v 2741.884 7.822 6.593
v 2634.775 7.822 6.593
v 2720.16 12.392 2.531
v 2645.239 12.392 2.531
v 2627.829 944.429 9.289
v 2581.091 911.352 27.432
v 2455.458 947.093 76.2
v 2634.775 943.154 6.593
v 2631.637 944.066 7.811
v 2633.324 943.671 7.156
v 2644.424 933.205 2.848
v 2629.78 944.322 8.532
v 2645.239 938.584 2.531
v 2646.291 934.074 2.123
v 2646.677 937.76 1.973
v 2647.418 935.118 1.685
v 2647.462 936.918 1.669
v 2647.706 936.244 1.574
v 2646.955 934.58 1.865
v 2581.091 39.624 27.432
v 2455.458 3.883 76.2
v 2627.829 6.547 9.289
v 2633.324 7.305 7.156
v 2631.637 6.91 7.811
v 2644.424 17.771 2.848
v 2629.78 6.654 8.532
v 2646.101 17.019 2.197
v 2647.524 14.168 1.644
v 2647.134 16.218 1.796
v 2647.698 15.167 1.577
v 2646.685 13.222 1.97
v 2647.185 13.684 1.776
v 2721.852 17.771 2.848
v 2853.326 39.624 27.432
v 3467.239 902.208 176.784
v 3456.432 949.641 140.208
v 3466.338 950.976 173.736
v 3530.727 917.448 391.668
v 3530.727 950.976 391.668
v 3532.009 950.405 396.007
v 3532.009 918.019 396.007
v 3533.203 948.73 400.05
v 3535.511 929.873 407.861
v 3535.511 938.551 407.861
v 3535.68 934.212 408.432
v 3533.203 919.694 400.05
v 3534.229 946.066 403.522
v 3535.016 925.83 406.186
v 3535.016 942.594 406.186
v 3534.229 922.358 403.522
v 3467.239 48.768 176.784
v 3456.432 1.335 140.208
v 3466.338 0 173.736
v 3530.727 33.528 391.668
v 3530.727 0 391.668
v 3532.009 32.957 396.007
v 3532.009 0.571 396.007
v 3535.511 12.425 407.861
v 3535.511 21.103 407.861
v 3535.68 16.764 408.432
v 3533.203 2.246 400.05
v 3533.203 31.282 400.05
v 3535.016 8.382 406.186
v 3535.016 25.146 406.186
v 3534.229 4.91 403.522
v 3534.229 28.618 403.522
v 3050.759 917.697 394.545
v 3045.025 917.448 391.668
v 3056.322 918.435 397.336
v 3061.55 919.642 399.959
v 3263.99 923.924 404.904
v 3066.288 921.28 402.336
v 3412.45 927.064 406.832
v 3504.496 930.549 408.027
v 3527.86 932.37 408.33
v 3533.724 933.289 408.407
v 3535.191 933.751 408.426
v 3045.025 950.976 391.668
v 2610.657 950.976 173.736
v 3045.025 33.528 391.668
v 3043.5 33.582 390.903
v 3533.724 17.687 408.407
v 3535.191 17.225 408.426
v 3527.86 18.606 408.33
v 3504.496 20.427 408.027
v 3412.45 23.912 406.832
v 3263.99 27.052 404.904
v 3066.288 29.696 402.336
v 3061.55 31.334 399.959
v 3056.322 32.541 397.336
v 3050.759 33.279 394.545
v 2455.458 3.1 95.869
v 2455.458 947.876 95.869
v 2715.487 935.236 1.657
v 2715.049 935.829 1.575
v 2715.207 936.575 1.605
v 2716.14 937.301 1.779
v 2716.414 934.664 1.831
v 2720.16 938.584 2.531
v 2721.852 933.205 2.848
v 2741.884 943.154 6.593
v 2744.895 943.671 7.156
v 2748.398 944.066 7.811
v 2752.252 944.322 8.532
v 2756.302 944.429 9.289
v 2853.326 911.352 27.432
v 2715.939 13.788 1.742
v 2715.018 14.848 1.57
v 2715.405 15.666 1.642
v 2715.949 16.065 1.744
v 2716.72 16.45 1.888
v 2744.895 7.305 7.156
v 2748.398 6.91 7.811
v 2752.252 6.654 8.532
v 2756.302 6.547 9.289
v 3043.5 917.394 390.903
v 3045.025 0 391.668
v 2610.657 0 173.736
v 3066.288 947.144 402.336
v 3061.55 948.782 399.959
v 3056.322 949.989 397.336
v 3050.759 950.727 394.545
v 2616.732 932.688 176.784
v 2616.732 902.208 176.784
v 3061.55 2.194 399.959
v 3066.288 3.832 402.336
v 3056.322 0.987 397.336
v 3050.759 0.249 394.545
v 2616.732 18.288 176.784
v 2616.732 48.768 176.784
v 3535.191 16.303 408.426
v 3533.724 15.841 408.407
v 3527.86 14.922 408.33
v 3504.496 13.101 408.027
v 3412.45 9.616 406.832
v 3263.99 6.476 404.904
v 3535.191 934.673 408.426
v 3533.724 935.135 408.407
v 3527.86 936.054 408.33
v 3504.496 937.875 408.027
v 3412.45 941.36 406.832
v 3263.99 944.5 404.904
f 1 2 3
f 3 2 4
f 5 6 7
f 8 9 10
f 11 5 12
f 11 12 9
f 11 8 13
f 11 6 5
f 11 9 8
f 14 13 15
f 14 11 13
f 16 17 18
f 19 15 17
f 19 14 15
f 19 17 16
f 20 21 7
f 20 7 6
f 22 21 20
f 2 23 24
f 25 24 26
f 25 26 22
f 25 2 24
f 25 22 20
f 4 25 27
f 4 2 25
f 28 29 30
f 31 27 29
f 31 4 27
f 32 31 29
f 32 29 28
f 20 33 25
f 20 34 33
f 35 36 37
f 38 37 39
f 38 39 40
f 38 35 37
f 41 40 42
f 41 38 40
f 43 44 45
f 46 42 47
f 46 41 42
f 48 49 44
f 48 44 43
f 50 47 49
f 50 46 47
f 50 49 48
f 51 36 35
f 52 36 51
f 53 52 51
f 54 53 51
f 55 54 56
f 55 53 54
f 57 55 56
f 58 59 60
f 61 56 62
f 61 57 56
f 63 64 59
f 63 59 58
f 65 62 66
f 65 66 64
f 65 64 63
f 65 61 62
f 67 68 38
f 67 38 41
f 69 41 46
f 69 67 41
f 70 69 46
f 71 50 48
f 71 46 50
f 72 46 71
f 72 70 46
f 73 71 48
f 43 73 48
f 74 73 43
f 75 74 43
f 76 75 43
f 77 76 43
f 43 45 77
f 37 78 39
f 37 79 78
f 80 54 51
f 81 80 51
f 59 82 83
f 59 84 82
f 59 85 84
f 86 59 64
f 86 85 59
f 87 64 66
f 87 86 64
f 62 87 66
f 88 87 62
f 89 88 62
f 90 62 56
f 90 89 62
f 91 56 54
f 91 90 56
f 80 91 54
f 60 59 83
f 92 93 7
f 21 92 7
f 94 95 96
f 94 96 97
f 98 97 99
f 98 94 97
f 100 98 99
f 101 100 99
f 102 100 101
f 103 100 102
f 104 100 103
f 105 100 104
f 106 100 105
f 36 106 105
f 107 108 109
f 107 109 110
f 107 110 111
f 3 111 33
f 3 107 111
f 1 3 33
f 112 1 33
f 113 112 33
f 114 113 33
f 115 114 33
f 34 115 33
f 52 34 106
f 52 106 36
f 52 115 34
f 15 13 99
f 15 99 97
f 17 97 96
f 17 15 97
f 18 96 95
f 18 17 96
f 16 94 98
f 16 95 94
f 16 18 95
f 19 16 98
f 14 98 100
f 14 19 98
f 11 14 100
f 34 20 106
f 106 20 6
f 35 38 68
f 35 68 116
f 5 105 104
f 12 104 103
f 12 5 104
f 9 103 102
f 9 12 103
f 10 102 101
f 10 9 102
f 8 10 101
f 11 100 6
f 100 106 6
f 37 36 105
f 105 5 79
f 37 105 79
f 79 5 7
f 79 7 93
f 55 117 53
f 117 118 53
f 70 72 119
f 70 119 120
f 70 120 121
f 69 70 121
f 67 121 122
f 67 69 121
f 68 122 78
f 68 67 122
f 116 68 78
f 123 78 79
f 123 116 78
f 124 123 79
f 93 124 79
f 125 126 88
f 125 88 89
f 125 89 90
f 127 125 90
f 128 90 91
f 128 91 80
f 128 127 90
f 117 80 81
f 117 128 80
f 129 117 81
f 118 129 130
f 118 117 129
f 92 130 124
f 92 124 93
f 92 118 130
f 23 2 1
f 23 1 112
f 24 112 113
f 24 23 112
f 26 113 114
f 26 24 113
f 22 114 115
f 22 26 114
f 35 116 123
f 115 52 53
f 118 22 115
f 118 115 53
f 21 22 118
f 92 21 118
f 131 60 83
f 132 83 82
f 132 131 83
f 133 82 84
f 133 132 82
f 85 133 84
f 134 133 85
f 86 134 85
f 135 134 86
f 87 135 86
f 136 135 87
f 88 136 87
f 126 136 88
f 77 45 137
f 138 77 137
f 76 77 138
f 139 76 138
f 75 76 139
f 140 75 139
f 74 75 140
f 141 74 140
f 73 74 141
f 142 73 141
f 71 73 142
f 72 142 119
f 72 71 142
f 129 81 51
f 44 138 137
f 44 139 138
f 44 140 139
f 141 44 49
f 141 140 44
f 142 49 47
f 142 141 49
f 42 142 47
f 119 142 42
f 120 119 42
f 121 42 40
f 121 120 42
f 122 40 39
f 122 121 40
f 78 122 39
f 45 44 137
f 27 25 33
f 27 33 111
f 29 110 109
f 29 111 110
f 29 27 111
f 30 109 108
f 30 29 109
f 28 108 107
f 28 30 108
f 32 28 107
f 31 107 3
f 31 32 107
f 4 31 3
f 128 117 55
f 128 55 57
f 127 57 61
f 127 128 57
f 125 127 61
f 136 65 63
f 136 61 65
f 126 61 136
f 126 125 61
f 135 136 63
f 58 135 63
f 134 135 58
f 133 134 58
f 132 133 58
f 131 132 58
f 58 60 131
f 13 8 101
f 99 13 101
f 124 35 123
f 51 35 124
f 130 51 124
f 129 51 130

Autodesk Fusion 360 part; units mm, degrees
sketch "Sketch7" plane through (0, 0, 0) normal (0, 1, 0) x (1, 0, 0)
  line L0 (2455.4576, -95.8693) -> (2455.4576, -76.2)
  line L1 (2455.4576, -76.2) -> (2651.76, 0)
  line L2 (2651.76, 0) -> (2706.624, 0)
  line L3 (2706.624, 0) -> (3456.432, -140.208)
  line L4 (3456.432, -140.208) -> (3535.68, -408.432)
  line L5 (3535.68, -408.432) -> (3066.288, -402.336)
  line L6 (3066.288, -402.336) -> (2455.4576, -95.8693)
extrude "Extrude5" add sketch "Sketch7" along normal blind 950.976
sketch "Sketch8" plane through (0, 0, 0) normal (1, 0, 0) x (0, 1, 0)
  line L0 (950.976, 426.72) -> (0, 426.72)
  line L1 (475.488, 426.72) -> (475.488, -243.84)
  line L2 (1005.84, 457.2) -> (-54.0718, 457.2)
  line L3 (-54.0718, 457.2) -> (-54.0718, -231.5284)
  line L4 (-54.0718, -231.5284) -> (1005.84, -231.5284)
  line L5 (1005.84, -231.5284) -> (1005.84, 457.2)
  line L6 (911.352, 27.432) -> (933.2048, 2.8476)
  line L7 (938.5836, 2.5312) -> (943.1535, 6.5933)
  line L8 (944.4292, 9.2894) -> (950.976, 173.736)
  line L9 (950.976, 173.736) -> (950.976, 391.668)
  line L10 (917.448, 391.668) -> (902.208, 176.784)
  line L11 (902.208, 176.784) -> (475.488, 176.784)
  arc A0 (950.976, 391.668) -> (917.448, 391.668) centre (934.212, 391.668) ccw
  line L12 (911.352, 27.432) -> (475.488, 27.432)
  arc A1 (933.2048, 2.8476) -> (938.5836, 2.5312) centre (936.0524, 5.3789) ccw
  arc A2 (943.1535, 6.5933) -> (944.4292, 9.2894) centre (940.6223, 9.4409) ccw
  line L13 (48.768, 176.784) -> (475.488, 176.784)
  line L14 (33.528, 391.668) -> (48.768, 176.784)
  arc A3 (33.528, 391.668) -> (0, 391.668) centre (16.764, 391.668) ccw
  line L15 (0, 173.736) -> (0, 391.668)
  line L16 (6.5468, 9.2894) -> (0, 173.736)
  arc A4 (6.5468, 9.2894) -> (7.8225, 6.5933) centre (10.3537, 9.4409) ccw
  line L17 (12.3924, 2.5312) -> (7.8225, 6.5933)
  arc A5 (12.3924, 2.5312) -> (17.7712, 2.8476) centre (14.9236, 5.3789) ccw
  line L18 (39.624, 27.432) -> (17.7712, 2.8476)
  line L19 (39.624, 27.432) -> (475.488, 27.432)
  dimension "d19" = 3.81
extrude "Extrude6" cut sketch "Sketch8" along normal blind 3962.4
ref_plane "WorkPlane3" through (3041.9851, 475.488, 481.584) normal (0, 0, 1) x (0, -1, 0)
sketch "Sketch10" plane through (0, 0, 481.584) normal (0, 0, 1) x (-1, 0, 0)
  line L0 (-2616.7317, -902.208) -> (-2616.7317, -48.768)
  line L1 (-2616.7317, -48.768) -> (-3467.2386, -48.768)
  line L2 (-3467.2386, -48.768) -> (-3467.2386, -902.208)
  line L3 (-3467.2386, -902.208) -> (-2616.7317, -902.208)
  line L4 (-2616.7317, -475.488) -> (-3627.1201, -475.488)
  line L5 (-2616.7317, -475.488) -> (-2616.7317, -932.688)
  line L6 (-2616.7317, -932.688) -> (-3467.2386, -902.208)
  line L7 (-3467.2386, -902.208) -> (-3467.2386, -475.488)
  line L8 (-2616.7317, -475.488) -> (-2616.7317, -18.288)
  line L9 (-2616.7317, -18.288) -> (-3467.2386, -48.768)
  line L10 (-3467.2386, -48.768) -> (-3467.2386, -475.488)
extrude "Extrude7" cut sketch "Sketch10" against normal blind 304.8 contours L3 L5 L6 | L1 L8 L9
